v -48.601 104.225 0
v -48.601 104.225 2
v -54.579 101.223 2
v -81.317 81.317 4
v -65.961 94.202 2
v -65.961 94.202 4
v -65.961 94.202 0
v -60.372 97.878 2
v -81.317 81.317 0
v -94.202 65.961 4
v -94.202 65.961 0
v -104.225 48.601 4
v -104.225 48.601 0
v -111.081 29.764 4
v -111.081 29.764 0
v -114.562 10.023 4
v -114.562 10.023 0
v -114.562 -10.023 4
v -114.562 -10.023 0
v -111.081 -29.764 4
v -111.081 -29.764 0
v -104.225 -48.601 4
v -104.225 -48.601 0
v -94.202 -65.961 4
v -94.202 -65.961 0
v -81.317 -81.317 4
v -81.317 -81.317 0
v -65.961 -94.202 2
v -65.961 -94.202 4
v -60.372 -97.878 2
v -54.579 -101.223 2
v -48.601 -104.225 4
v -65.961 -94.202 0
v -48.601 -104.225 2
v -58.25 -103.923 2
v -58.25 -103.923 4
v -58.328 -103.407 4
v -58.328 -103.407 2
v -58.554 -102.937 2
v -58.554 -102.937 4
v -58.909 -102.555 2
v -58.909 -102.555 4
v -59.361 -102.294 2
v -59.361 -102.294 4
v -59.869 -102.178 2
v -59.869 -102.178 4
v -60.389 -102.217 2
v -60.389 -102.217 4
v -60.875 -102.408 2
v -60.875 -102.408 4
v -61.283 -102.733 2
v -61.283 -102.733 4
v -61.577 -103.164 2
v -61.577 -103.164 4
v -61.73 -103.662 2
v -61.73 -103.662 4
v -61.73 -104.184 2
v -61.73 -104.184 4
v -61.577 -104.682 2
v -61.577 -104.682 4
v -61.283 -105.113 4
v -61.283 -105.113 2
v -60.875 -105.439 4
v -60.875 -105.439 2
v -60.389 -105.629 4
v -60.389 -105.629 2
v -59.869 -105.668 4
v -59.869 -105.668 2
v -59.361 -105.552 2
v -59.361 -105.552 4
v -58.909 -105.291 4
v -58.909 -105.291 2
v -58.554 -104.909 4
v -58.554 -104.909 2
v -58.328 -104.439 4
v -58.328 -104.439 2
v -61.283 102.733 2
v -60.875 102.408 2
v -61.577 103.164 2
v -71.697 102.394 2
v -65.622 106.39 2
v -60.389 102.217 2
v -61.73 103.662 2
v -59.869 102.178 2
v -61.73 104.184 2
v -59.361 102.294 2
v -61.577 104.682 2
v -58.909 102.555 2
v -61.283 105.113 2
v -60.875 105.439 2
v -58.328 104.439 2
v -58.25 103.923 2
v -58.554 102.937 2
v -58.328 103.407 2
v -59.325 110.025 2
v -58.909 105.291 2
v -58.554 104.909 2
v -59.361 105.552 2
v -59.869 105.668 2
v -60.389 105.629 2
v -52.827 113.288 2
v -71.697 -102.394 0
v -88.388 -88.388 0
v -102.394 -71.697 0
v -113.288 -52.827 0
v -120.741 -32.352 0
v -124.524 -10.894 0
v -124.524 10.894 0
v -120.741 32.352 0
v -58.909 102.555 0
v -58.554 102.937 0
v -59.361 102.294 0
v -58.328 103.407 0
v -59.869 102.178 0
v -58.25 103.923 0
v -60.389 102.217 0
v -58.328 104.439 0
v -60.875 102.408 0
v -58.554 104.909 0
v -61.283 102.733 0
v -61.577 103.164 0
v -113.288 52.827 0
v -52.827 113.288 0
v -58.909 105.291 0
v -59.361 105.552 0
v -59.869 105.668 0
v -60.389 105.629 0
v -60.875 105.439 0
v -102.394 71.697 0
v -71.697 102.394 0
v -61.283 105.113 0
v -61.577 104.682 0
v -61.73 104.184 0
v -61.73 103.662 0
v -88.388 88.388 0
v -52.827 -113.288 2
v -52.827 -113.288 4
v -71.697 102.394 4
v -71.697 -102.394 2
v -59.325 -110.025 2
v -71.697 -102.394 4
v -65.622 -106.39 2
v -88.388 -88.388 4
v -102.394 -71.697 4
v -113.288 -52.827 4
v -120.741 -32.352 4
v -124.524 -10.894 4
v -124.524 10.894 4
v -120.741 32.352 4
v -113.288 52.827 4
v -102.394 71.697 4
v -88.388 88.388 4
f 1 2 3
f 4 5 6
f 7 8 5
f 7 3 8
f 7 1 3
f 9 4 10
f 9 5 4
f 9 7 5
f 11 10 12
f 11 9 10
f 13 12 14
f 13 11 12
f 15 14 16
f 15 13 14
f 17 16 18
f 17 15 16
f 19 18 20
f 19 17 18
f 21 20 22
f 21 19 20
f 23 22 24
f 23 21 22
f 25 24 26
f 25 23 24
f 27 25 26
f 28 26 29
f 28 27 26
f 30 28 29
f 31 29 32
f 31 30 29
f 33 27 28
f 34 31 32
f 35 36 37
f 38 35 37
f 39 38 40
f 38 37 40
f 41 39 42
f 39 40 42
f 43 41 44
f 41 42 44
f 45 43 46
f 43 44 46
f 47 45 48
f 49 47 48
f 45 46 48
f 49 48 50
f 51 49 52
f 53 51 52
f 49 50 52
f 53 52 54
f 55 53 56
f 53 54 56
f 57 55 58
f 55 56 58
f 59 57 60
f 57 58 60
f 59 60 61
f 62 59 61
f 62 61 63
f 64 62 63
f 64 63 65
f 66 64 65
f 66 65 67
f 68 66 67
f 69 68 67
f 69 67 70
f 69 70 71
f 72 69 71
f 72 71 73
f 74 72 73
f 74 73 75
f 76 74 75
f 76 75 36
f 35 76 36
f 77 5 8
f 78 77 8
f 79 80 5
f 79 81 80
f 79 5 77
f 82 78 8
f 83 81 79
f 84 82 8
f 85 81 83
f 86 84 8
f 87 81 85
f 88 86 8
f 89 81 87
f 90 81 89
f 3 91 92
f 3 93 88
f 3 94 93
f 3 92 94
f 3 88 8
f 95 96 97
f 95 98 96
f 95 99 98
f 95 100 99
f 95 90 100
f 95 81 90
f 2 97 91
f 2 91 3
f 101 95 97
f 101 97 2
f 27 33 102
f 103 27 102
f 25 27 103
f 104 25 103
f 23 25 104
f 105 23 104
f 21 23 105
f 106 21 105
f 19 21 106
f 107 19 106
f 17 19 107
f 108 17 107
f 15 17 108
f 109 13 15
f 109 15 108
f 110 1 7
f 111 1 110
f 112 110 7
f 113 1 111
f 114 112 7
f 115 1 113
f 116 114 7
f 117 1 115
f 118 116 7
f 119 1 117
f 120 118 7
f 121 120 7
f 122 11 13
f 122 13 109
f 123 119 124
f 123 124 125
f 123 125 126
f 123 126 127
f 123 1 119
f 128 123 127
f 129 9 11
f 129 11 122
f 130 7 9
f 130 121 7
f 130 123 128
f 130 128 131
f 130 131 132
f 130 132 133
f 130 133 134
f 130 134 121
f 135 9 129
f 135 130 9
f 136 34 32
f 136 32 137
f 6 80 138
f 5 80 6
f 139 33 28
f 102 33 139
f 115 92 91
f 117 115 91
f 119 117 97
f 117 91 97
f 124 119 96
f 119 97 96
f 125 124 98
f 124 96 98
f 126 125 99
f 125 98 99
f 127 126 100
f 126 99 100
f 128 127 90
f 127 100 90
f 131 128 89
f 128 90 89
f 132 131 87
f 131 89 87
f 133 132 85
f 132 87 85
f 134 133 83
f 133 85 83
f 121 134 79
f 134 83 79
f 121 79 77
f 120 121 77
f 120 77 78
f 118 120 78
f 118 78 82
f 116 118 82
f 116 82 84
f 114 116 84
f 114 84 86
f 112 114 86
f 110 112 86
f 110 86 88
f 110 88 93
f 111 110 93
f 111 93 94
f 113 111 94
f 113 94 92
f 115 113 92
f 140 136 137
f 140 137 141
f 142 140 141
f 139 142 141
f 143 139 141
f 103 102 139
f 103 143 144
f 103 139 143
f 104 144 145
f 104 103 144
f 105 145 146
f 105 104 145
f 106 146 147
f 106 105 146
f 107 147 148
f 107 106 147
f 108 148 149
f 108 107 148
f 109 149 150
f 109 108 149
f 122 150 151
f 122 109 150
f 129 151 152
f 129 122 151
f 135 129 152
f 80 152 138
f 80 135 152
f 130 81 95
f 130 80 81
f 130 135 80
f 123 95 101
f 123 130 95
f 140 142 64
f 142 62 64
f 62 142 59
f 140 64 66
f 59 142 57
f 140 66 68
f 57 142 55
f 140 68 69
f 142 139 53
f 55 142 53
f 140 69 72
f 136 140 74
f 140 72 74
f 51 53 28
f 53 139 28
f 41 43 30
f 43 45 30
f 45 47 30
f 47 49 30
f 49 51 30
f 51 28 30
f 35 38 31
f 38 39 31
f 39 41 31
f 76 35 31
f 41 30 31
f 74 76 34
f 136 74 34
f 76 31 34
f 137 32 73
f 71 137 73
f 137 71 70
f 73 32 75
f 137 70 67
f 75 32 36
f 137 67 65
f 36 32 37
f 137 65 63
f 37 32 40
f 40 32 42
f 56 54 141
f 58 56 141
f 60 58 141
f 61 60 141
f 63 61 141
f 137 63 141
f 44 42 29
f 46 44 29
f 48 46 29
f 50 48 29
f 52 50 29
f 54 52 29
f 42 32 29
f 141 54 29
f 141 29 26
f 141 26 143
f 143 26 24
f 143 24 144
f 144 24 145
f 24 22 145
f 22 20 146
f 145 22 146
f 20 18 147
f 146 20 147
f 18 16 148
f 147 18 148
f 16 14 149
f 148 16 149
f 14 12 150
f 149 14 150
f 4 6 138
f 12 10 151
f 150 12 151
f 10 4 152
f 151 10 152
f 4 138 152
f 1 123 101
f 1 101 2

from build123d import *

# Parameters (mm, degrees)
BOSS_EXTRU_1_DEPTH      = 4
ESQUISSE3_R             = 1.75
ENL_V_MAT_EXTRU_1_DEPTH = 10
ENL_V_START             = -2
ENL_V_MAT_EXTRU_2_DEPTH = 2
ENL_V_MAT_EXTRU_3_DEPTH = 2


with BuildPart() as part:
    # Esquisse1 → Boss.-Extru.1 (new body)
    with BuildSketch(Plane.XY):
        with BuildLine():
            Line((-48.6011001, -104.225395509), (-52.827282718, -113.28847338))
            ThreePointArc((-52.827282718, -113.28847338), (-105.423930727, -67.162451043), (-125, 0))
            ThreePointArc((-125, 0), (-105.423930727, 67.162451043), (-52.827282718, 113.28847338))
            Line((-52.827282718, 113.28847338), (-48.6011001, 104.225395509))
            ThreePointArc((-48.6011001, 104.225395509), (-115, 0), (-48.6011001, -104.225395509))
        make_face()
    extrude(amount=BOSS_EXTRU_1_DEPTH)

    # Esquisse3 → Enlèv. mat.-Extru.1 (cut)
    with BuildSketch(Plane.XY.offset(4)):
        with Locations((-60, 103.923048454)):
            Circle(ESQUISSE3_R)
        with Locations((-60, -103.923048454)):
            Circle(ESQUISSE3_R)
    extrude(amount=-ENL_V_MAT_EXTRU_1_DEPTH, mode=Mode.SUBTRACT)

    # Esquisse4 → Enlèv. mat.-Extru.2 (cut)
    with BuildSketch(Plane.XY.offset(4).offset(ENL_V_START)):
        with BuildLine():
            Line((-71.697054544, 102.394005536), (-65.96129018, 94.202485093))
            ThreePointArc((-65.96129018, 94.202485093), (-57.5, 99.592921435), (-48.6011001, 104.225395509))
            Line((-48.6011001, 104.225395509), (-52.827282718, 113.28847338))
            ThreePointArc((-52.827282718, 113.28847338), (-62.5, 108.253175473), (-71.697054544, 102.394005536))
        make_face()
    extrude(amount=ENL_V_MAT_EXTRU_2_DEPTH, mode=Mode.SUBTRACT)

    # Esquisse6 → Enlèv. mat.-Extru.3 (cut)
    with BuildSketch(Plane(origin=(0, 0, 0), x_dir=(-1, 0, 0), z_dir=(0, 0, -1))):
        with BuildLine():
            Line((65.96129018, -94.202485093), (71.697054544, -102.394005536))
            ThreePointArc((71.697054544, -102.394005536), (62.5, -108.253175473), (52.827282718, -113.28847338))
            Line((52.827282718, -113.28847338), (48.6011001, -104.225395509))
            ThreePointArc((48.6011001, -104.225395509), (57.5, -99.592921435), (65.96129018, -94.202485093))
        make_face()
    extrude(amount=-ENL_V_MAT_EXTRU_3_DEPTH, mode=Mode.SUBTRACT)


solid = part.part
